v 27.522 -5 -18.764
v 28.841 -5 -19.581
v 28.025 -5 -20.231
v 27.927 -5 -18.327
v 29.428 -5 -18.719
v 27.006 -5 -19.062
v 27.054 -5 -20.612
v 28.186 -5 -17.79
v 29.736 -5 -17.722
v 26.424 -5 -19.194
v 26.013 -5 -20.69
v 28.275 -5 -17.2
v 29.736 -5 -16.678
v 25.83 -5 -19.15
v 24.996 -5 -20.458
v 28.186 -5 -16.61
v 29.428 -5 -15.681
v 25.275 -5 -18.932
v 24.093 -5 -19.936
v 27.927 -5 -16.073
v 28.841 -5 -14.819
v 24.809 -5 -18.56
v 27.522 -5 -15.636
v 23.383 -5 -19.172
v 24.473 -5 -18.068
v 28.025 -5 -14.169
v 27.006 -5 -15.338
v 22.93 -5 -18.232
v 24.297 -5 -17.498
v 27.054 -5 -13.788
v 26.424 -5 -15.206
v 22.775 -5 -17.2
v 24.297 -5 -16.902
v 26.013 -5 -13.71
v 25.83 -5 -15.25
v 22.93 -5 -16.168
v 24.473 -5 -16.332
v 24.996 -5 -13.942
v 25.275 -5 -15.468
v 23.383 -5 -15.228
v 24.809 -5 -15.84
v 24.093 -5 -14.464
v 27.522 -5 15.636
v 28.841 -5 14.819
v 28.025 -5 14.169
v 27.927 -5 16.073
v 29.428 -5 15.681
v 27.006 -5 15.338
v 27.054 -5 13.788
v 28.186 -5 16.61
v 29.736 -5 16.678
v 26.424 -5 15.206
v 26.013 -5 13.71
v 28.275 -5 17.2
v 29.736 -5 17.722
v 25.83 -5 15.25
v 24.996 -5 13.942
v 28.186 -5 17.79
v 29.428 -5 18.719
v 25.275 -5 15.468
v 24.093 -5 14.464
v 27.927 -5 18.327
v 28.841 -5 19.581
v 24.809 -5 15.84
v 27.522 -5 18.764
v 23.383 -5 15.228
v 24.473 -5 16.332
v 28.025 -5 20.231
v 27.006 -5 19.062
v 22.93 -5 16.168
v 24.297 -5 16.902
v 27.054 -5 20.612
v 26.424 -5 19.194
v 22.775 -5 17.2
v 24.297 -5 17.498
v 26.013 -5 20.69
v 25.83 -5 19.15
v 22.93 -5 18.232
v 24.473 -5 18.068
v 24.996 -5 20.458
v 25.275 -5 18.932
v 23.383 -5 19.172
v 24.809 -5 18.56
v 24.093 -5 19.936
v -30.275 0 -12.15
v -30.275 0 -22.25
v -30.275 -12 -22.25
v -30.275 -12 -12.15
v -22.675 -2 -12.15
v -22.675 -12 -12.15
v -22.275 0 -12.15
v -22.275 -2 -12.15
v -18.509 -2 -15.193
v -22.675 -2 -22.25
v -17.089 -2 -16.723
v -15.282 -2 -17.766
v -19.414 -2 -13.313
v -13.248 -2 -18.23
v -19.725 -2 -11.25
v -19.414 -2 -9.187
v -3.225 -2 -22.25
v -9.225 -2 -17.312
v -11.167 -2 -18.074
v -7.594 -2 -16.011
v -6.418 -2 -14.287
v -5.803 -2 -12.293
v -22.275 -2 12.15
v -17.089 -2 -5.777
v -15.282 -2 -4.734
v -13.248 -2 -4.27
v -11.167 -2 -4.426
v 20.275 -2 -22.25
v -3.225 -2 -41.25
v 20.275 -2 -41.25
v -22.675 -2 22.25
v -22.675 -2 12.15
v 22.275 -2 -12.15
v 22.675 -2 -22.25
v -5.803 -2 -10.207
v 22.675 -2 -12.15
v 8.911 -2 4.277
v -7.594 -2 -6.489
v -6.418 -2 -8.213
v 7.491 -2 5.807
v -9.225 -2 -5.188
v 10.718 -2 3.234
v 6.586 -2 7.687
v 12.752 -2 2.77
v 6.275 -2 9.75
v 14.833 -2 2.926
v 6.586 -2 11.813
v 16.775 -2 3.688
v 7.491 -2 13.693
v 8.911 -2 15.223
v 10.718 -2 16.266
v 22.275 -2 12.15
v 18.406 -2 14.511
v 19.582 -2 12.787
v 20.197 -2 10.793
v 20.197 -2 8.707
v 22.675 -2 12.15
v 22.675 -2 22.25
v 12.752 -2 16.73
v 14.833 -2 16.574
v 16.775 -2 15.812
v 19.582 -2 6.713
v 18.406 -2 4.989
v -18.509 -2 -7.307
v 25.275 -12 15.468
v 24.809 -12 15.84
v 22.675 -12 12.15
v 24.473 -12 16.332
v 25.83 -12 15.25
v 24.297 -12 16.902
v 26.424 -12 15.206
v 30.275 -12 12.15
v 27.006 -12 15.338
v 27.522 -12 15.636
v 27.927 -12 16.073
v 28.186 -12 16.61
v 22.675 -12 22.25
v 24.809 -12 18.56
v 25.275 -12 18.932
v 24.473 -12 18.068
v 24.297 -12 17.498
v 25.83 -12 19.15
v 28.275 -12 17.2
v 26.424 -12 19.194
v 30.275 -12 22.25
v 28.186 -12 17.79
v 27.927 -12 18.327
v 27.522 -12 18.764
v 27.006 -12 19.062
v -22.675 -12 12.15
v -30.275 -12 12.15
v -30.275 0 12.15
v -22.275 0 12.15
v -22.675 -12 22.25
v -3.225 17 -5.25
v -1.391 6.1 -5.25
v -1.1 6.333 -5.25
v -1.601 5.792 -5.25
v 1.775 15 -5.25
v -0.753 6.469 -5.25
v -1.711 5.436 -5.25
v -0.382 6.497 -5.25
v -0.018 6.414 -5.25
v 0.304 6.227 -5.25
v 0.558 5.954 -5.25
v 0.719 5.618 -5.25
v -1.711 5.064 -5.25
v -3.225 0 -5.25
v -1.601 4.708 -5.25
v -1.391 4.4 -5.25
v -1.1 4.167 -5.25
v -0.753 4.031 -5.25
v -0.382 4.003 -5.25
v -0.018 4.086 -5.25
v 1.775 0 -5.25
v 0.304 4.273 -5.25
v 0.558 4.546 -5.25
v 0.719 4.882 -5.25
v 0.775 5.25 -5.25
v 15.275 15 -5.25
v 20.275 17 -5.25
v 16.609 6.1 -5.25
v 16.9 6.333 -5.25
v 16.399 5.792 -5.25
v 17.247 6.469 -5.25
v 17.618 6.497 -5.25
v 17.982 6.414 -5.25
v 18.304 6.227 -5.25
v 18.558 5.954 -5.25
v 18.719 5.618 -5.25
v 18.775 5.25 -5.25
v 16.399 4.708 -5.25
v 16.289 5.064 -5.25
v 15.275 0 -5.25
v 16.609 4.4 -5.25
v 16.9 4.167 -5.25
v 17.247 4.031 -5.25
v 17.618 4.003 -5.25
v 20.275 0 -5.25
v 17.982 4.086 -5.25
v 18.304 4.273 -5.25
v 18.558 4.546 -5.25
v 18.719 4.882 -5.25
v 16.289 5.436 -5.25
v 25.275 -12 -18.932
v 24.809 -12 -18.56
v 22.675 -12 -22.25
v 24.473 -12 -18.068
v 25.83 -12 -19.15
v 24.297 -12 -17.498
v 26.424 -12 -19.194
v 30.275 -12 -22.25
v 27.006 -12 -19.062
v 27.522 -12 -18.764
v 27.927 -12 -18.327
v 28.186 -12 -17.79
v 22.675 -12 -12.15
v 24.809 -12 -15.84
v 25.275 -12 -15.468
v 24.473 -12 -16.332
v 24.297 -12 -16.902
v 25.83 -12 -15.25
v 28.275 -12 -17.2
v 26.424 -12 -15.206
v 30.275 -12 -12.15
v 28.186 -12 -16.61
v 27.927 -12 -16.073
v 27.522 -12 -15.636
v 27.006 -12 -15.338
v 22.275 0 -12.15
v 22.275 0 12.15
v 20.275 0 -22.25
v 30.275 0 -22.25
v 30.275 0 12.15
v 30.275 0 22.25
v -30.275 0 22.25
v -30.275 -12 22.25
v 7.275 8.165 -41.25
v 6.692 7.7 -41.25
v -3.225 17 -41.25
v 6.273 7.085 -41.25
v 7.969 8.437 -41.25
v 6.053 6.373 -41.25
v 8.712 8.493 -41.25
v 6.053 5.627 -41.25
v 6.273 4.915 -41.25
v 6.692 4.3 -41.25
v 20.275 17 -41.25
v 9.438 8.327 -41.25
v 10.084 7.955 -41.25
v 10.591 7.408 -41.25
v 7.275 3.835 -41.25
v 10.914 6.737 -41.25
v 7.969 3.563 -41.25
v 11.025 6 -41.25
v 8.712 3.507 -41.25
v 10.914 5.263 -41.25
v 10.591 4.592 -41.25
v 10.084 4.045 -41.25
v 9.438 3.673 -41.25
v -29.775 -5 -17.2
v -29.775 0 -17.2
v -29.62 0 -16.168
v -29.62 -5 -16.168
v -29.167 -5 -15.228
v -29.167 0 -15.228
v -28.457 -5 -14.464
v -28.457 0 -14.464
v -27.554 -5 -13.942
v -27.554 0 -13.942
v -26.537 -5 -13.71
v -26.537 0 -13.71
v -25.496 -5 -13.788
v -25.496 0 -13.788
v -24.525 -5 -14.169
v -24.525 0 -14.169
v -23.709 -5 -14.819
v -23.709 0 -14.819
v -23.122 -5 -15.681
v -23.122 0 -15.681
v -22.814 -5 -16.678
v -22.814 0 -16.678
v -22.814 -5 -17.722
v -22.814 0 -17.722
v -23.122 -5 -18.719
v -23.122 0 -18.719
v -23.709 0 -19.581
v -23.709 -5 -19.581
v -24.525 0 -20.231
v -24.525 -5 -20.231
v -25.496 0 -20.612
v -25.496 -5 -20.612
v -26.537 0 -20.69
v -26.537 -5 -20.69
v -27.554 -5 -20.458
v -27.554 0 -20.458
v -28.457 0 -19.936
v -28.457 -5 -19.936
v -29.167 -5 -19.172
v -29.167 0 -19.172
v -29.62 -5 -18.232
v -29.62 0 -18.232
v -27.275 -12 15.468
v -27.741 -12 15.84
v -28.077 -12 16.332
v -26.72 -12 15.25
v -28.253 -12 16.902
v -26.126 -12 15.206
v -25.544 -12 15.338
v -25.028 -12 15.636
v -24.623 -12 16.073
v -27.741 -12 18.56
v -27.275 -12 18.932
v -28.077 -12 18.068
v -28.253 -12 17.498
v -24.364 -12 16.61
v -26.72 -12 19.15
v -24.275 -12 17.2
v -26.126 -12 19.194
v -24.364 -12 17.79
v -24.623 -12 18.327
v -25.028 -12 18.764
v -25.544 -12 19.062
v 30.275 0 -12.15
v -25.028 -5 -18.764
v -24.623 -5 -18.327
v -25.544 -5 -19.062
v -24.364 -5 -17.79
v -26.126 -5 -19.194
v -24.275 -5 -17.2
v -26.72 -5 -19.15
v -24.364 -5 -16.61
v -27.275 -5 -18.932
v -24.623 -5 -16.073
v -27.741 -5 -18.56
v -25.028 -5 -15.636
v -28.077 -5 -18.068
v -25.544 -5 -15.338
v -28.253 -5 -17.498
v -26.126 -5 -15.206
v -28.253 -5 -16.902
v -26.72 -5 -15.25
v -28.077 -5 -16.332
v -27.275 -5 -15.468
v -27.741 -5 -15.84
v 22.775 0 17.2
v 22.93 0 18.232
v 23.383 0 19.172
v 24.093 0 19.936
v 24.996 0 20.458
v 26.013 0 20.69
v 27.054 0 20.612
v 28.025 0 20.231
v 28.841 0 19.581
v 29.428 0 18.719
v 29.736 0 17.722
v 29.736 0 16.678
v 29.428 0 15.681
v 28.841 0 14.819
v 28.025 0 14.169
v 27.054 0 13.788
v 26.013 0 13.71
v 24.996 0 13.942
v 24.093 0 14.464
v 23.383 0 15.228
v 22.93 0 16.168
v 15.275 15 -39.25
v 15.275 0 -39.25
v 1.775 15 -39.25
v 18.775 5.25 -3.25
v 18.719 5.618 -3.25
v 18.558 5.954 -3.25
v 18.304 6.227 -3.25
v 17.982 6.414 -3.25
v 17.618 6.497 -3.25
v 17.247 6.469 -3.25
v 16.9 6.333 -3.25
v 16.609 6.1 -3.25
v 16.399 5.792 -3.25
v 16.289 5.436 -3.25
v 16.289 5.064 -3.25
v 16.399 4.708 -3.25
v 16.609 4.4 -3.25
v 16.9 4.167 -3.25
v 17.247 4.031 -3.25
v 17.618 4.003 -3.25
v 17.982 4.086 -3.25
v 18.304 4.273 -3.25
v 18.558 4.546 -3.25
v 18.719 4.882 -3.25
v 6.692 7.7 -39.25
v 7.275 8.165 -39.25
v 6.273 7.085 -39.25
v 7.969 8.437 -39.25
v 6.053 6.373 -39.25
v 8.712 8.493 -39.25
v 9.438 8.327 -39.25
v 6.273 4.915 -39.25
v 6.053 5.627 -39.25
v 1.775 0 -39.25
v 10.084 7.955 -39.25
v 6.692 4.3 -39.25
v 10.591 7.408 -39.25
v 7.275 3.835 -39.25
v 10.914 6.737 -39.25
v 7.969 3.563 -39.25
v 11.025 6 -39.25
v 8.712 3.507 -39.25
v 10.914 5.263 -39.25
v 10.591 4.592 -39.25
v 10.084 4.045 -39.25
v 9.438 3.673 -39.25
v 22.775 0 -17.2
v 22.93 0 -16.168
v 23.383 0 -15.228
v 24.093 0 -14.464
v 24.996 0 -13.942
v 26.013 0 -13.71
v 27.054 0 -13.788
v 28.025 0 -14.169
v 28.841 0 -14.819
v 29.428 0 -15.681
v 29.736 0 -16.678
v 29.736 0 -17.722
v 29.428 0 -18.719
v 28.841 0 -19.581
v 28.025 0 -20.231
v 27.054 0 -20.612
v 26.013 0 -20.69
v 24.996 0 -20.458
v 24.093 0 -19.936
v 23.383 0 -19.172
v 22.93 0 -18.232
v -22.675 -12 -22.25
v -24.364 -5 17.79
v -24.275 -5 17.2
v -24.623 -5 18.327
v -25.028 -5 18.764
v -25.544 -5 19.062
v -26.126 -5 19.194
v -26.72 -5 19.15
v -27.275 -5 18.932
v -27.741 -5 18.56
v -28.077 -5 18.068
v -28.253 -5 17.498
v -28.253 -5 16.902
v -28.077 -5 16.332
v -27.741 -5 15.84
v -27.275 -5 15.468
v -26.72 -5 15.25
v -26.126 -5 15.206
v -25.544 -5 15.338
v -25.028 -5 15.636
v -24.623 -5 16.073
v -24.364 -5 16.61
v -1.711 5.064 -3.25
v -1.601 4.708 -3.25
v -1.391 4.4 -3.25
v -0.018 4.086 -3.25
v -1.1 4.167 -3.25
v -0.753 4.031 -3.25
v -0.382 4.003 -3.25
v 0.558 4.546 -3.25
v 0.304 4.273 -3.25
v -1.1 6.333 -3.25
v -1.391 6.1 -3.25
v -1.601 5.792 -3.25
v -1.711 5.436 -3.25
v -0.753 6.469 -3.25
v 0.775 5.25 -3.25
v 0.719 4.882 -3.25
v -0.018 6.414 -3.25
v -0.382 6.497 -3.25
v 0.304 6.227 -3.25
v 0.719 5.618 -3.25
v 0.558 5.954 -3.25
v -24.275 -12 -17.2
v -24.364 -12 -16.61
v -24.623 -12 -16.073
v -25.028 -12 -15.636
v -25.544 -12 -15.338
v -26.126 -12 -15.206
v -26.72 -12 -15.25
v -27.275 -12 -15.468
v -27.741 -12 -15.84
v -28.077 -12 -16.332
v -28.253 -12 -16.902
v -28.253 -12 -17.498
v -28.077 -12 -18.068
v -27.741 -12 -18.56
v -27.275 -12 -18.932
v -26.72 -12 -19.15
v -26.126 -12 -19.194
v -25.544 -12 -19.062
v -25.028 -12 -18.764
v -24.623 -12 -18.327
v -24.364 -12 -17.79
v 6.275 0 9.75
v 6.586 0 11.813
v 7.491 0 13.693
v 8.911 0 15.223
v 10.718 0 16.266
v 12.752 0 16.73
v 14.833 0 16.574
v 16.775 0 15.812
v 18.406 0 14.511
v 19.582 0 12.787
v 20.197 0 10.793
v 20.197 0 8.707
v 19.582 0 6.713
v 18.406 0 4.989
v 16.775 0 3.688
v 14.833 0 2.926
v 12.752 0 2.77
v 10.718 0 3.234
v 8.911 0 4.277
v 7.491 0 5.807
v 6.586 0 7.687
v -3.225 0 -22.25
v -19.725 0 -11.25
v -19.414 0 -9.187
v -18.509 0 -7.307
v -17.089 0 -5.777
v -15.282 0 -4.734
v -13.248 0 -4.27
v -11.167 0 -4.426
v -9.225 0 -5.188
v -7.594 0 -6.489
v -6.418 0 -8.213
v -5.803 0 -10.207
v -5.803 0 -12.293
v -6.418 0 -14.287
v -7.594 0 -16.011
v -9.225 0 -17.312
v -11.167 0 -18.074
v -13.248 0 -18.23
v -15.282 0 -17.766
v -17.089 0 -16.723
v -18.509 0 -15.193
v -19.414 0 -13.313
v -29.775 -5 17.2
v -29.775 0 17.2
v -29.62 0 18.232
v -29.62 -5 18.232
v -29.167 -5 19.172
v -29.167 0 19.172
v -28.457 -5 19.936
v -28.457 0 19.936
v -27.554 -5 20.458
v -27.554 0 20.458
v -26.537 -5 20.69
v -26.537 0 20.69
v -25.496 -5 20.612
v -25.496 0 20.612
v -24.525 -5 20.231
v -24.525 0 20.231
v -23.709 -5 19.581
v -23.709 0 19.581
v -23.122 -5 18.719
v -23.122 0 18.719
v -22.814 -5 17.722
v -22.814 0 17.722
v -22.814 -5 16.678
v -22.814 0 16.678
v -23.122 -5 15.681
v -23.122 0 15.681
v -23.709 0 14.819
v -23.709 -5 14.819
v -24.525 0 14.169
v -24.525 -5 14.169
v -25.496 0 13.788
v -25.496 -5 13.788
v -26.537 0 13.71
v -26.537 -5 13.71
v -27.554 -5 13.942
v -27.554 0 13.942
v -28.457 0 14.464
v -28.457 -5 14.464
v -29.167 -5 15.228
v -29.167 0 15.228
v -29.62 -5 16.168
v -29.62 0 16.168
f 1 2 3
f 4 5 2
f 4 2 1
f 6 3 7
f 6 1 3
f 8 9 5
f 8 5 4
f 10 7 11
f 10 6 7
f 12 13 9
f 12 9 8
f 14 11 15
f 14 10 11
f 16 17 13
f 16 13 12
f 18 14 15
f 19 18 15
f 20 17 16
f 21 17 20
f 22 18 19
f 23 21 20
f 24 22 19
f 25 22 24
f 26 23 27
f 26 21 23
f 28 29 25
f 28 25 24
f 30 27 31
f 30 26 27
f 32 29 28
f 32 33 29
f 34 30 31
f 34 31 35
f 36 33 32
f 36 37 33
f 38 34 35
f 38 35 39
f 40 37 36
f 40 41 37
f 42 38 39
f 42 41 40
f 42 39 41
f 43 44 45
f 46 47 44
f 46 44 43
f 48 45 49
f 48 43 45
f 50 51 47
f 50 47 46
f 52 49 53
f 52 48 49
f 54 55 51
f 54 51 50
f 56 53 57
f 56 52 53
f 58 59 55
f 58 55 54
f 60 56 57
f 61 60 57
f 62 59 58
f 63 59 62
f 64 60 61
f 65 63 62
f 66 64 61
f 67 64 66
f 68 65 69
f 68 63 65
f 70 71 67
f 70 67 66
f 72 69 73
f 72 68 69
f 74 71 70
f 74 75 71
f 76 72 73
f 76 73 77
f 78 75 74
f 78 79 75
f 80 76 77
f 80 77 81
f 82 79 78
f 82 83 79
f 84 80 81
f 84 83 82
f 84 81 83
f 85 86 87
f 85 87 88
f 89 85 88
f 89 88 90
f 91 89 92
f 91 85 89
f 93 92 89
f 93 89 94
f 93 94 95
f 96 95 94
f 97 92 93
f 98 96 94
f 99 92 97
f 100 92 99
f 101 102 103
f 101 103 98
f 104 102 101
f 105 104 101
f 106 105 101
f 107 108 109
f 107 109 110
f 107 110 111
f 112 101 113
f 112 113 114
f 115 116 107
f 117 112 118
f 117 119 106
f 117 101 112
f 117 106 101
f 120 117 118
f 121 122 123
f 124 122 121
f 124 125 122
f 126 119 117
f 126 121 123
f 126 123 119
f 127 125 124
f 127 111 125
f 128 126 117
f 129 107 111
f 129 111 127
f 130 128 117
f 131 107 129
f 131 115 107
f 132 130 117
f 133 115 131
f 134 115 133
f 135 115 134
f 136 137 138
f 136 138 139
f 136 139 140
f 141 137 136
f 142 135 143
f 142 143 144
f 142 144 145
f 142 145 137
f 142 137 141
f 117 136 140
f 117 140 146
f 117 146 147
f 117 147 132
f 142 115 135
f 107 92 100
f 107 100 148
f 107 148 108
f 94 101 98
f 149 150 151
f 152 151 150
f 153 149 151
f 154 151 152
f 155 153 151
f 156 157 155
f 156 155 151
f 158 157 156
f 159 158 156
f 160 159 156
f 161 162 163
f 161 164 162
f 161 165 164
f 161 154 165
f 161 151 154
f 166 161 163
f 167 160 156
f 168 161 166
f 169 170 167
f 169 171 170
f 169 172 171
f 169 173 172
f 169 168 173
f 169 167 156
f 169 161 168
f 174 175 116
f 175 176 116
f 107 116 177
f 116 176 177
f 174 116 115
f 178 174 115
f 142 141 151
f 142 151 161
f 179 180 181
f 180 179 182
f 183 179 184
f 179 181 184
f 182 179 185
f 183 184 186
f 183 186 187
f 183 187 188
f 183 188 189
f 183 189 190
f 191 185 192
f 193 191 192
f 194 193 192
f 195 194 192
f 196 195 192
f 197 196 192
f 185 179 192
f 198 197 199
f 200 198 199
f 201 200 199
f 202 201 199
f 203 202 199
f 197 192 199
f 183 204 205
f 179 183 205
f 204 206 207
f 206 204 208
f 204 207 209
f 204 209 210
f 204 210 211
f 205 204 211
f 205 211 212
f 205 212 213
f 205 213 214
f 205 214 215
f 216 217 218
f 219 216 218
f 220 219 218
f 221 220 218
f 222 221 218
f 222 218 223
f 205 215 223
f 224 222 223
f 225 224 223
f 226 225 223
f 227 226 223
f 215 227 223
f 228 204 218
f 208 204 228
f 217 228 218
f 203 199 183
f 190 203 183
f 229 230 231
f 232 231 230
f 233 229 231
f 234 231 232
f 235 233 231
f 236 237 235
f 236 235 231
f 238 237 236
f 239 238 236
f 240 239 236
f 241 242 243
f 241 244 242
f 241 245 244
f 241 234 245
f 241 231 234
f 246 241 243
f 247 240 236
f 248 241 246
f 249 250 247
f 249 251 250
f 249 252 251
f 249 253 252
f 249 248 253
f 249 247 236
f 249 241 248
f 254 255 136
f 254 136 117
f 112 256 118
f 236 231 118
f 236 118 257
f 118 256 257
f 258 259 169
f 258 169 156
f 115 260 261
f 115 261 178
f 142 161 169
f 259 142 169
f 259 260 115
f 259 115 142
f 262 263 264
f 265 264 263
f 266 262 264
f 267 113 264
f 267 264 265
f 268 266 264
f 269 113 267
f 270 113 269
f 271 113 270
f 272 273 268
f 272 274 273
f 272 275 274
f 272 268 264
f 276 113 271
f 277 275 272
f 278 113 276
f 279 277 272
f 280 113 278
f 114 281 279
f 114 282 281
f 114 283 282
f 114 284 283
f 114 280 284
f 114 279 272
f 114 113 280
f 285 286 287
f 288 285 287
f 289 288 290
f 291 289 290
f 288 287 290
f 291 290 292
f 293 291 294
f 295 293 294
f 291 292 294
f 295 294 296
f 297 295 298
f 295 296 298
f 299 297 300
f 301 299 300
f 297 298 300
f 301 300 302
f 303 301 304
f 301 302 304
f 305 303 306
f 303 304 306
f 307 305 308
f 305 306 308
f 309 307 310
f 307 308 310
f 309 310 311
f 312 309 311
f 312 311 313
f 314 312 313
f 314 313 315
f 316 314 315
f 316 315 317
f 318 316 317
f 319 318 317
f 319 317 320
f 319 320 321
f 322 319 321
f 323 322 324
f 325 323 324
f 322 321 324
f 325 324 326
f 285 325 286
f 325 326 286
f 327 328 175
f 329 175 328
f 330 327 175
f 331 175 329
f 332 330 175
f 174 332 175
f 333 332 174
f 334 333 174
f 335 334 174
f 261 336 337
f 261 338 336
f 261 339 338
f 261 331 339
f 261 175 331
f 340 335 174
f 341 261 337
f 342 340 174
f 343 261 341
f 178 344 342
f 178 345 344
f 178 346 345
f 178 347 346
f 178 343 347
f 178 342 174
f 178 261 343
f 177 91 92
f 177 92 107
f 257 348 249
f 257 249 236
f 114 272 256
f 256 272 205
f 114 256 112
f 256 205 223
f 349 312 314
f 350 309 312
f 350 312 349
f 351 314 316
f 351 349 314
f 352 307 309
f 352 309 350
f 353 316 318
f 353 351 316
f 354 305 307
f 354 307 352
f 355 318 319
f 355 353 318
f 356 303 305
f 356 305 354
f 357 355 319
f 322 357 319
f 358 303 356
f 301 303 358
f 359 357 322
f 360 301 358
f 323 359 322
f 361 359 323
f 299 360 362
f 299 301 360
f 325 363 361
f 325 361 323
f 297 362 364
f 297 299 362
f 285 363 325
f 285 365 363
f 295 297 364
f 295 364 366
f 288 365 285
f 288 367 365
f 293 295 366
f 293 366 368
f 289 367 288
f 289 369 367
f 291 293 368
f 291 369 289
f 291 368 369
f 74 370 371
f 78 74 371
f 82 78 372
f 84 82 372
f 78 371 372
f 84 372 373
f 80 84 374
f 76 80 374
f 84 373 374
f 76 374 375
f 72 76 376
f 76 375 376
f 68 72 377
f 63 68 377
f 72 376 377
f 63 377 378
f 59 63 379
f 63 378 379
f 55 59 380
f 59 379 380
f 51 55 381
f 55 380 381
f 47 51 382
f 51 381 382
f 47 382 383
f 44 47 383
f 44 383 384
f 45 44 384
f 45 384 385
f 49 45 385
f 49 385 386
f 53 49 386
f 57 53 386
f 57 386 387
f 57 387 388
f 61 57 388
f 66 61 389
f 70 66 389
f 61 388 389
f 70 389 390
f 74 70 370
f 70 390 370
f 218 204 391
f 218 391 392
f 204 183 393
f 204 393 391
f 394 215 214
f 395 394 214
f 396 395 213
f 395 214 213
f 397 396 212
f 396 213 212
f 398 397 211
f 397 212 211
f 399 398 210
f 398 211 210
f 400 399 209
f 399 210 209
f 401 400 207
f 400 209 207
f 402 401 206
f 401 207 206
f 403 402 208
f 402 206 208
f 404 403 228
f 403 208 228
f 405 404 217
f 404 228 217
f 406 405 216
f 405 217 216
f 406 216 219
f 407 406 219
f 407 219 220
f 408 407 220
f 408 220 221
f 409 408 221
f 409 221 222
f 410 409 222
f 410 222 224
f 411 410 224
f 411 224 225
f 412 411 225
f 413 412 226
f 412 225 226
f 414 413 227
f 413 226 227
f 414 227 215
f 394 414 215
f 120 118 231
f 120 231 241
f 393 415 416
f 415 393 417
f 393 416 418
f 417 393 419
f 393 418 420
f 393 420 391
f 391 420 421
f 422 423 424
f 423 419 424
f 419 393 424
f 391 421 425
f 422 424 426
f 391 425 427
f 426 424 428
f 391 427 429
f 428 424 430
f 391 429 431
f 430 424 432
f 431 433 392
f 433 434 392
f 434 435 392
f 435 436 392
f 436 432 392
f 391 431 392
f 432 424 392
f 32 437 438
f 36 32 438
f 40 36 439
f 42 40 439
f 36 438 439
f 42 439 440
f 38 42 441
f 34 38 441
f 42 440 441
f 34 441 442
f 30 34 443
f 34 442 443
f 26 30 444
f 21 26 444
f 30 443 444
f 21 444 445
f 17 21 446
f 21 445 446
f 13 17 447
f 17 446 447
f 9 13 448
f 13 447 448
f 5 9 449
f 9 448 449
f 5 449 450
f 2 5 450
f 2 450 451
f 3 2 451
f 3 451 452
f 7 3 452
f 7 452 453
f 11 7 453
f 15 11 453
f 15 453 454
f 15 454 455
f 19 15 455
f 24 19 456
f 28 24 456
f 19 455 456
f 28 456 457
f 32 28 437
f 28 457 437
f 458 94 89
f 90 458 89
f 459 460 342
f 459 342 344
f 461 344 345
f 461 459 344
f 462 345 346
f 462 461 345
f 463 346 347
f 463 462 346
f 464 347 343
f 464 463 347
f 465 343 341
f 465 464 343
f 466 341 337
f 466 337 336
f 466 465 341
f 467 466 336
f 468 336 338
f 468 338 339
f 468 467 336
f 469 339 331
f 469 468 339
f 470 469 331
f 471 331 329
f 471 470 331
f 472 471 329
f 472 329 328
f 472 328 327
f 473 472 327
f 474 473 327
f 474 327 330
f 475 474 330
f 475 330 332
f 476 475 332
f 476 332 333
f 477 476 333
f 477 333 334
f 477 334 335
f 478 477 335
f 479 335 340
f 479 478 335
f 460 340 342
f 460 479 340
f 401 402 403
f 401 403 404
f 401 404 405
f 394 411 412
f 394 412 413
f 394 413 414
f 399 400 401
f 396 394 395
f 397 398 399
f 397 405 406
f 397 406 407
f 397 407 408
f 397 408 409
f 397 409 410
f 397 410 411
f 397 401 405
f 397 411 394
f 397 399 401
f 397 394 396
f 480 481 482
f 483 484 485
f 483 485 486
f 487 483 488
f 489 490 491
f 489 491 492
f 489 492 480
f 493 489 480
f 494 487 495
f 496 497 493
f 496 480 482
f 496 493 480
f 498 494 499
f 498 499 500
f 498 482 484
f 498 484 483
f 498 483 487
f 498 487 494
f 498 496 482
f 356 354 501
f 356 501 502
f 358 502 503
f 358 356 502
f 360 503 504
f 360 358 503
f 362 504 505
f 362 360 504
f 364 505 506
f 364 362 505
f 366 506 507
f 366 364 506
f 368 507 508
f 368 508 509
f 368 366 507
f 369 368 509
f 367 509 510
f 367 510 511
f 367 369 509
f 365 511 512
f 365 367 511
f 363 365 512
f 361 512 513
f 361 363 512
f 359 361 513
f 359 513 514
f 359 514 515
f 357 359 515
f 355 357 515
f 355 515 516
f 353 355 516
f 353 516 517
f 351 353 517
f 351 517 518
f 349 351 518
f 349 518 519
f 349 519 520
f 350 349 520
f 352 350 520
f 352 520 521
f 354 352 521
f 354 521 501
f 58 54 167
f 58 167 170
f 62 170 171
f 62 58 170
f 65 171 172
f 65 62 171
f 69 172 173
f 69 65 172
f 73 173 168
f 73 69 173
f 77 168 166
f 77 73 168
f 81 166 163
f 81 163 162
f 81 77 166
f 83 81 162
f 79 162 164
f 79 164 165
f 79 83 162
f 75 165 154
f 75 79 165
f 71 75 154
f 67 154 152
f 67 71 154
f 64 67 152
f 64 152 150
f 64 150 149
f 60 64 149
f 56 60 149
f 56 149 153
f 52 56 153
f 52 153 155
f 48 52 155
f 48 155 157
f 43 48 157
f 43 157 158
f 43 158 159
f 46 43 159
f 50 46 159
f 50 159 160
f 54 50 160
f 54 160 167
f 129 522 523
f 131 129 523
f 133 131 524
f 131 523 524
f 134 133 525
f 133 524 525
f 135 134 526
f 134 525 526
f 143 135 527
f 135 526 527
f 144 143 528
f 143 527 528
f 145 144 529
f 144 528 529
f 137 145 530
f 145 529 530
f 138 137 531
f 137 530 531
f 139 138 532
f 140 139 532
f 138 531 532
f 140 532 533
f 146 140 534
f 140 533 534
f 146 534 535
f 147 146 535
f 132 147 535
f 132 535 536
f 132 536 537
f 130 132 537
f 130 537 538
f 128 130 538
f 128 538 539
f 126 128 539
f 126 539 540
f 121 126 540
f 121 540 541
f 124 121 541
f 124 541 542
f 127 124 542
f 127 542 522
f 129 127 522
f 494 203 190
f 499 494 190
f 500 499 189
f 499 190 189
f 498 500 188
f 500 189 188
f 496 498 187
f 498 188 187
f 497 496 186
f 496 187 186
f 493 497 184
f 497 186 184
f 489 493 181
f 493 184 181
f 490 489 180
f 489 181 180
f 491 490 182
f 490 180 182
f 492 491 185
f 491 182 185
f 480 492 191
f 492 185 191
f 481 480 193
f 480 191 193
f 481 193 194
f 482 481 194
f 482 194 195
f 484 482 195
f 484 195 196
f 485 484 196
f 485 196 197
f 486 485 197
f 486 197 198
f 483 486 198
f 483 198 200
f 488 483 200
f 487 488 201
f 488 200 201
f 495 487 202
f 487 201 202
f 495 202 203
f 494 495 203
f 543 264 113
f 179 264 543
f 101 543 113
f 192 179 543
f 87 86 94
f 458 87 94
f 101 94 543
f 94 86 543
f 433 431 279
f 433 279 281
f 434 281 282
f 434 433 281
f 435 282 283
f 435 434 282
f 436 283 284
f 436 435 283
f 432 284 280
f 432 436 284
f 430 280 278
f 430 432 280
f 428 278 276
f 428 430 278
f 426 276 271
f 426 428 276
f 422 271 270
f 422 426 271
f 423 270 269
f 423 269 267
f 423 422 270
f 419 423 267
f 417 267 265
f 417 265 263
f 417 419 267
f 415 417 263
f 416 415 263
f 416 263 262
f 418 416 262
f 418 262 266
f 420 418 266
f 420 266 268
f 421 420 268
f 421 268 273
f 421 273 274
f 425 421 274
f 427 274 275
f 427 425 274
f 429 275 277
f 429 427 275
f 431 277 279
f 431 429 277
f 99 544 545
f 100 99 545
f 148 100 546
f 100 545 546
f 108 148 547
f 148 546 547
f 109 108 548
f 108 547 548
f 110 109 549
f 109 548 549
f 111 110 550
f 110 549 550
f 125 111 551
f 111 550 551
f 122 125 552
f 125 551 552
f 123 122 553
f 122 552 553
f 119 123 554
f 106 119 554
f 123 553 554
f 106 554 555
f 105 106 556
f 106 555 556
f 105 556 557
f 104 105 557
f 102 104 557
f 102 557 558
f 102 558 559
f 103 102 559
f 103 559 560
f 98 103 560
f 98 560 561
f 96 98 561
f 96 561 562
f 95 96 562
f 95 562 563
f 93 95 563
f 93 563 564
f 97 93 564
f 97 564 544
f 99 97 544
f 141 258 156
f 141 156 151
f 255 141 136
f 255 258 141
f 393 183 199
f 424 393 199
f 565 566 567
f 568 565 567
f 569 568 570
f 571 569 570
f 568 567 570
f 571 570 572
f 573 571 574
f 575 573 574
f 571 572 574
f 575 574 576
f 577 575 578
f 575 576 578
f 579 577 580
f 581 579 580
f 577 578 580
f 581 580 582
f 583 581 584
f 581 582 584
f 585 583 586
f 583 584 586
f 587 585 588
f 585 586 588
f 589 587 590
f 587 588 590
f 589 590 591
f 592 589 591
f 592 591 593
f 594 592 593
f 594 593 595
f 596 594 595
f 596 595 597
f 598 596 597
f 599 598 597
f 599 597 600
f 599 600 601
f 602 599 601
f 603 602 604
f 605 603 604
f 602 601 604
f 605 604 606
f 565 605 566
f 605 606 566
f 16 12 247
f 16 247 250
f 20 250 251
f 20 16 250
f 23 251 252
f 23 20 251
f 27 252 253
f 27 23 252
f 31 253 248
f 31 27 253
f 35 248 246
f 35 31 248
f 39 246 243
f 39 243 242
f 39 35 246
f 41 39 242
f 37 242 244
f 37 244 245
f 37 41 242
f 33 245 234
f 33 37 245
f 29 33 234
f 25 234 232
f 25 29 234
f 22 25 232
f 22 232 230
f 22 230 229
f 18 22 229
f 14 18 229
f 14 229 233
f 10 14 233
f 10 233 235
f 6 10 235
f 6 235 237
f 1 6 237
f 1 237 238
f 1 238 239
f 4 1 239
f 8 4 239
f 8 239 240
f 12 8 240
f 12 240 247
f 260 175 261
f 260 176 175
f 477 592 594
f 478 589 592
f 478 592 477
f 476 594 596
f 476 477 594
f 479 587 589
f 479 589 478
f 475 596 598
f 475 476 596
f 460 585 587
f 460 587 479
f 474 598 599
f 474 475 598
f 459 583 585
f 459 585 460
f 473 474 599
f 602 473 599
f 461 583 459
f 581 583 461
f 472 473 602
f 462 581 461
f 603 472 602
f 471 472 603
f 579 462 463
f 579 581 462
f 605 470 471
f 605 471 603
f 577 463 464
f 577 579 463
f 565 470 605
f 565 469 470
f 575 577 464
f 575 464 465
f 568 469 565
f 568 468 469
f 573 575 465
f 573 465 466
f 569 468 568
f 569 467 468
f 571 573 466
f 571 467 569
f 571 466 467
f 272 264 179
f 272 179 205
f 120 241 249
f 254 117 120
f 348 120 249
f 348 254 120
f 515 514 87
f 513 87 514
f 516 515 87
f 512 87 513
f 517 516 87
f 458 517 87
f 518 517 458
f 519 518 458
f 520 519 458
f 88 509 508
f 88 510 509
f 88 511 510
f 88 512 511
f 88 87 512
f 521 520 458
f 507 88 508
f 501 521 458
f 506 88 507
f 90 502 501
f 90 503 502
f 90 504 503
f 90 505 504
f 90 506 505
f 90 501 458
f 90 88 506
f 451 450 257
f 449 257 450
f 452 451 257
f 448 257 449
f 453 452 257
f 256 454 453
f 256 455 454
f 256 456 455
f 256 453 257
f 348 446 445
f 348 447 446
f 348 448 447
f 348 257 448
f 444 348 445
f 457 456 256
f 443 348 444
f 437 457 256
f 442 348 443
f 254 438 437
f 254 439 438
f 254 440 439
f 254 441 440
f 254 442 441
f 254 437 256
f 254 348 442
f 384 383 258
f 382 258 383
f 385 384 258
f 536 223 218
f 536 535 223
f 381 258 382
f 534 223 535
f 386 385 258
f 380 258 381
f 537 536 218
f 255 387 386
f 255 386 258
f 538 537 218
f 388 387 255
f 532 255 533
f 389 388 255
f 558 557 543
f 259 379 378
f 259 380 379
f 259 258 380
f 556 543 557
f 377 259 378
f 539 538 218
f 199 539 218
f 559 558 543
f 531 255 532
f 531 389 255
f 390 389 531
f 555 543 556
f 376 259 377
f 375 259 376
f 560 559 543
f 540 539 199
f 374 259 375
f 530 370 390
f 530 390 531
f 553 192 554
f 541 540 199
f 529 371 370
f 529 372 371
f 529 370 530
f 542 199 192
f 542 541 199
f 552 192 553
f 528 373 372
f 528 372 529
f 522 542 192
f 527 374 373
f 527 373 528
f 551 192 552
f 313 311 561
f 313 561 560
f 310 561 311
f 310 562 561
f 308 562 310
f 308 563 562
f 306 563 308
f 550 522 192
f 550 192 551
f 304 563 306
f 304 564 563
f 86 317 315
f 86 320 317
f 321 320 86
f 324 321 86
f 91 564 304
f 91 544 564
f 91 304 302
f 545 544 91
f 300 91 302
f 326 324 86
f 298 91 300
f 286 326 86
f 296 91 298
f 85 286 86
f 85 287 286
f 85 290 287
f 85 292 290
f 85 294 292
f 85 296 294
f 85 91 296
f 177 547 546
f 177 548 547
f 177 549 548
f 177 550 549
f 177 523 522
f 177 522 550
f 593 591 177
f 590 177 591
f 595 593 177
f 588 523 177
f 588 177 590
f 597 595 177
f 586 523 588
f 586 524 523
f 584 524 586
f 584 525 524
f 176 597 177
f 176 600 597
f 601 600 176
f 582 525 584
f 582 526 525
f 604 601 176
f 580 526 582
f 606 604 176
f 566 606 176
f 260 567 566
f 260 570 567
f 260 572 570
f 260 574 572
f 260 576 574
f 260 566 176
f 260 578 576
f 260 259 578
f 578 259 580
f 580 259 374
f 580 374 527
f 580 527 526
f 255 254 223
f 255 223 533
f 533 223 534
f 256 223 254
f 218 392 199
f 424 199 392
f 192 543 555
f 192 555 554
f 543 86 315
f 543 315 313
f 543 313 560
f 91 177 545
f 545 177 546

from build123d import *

# Parameters (mm, degrees)
SKETCH_R        = 2
PAD_DEPTH       = 2
SKETCH001_W     = 7.6
SKETCH001_H     = 10.1
SKETCH001_R     = 2
PAD001_DEPTH    = 10
SKETCH002_R     = 7
POCKET_DEPTH    = 12.001
SKETCH004_W     = 13.5
SKETCH004_H     = 15
PAD003_DEPTH    = 34
SKETCH005_W     = 23.5
SKETCH005_H     = 19
SKETCH005_R     = 2.5
PAD004_DEPTH    = 2
SKETCH006_R     = 1.25
PAD005_DEPTH    = 2
SKETCH007_R     = 3.5
POCKET001_DEPTH = 5


with BuildPart() as part:
    # Sketch → Pad (new body)
    with BuildSketch(Plane.XZ):
        Polygon((-22.275, 22.25), (22.275, 22.25), (30.275, 22.25), (30.275, 12.15), (22.275, 12.15), (22.275, -12.15), (30.275, -12.15), (30.275, -22.25), (22.275, -22.25), (-22.275, -22.25), (-30.275, -22.25), (-30.275, -12.15), (-22.275, -12.15), (-22.275, 12.15), (-30.275, 12.15), (-30.275, 22.25), align=None)
        with Locations((-26.275, 17.2)):
            Circle(SKETCH_R, mode=Mode.SUBTRACT)
        with Locations((26.275, 17.2)):
            Circle(SKETCH_R, mode=Mode.SUBTRACT)
        with Locations((26.275, -17.2)):
            Circle(SKETCH_R, mode=Mode.SUBTRACT)
        with Locations((-26.275, -17.2)):
            Circle(SKETCH_R, mode=Mode.SUBTRACT)
    extrude(amount=PAD_DEPTH)

    # Sketch001 (on Face22 of Pad) → Pad001 (join)
    with BuildSketch(Plane.XZ.offset(2)):
        with Locations((-26.475, 17.2)):
            Rectangle(SKETCH001_W, SKETCH001_H)
        with Locations((-26.275, 17.2)):
            Circle(SKETCH001_R, mode=Mode.SUBTRACT)
        with Locations((-26.475, -17.2)):
            Rectangle(SKETCH001_W, SKETCH001_H)
        with Locations((-26.275, -17.2)):
            Circle(SKETCH001_R, mode=Mode.SUBTRACT)
        with Locations((26.475, -17.2)):
            Rectangle(SKETCH001_W, SKETCH001_H)
        with Locations((26.275, -17.2)):
            Circle(SKETCH001_R, mode=Mode.SUBTRACT)
        with Locations((26.475, 17.2)):
            Rectangle(SKETCH001_W, SKETCH001_H)
        with Locations((26.275, 17.2)):
            Circle(SKETCH001_R, mode=Mode.SUBTRACT)
    extrude(amount=PAD001_DEPTH)

    # Sketch002 (on Face4 of Pad001) → Pocket (cut, through all)
    with BuildSketch(Plane(origin=(0, 0, 0), x_dir=(-1, 0, 0), z_dir=(0, 1, 0))):
        with Locations((-13.275, 9.75)):
            Circle(SKETCH002_R)
        with Locations((12.725, -11.25)):
            Circle(SKETCH002_R)
    extrude(amount=-POCKET_DEPTH, mode=Mode.SUBTRACT)

    # Sketch004 (on DatumPlane) → Pad003 (join)
    with BuildSketch(Plane(origin=(0, 0, -5.25), x_dir=(1, 0, 0), z_dir=(0, 0, -1))):
        Polygon((-3.225, 0), (-3.225, -17), (20.275, -17), (20.275, 0), (20.275, 2), (-3.225, 2), align=None)
        with Locations((8.525, -7.5)):
            Rectangle(SKETCH004_W, SKETCH004_H, mode=Mode.SUBTRACT)
    extrude(amount=PAD003_DEPTH)

    # Sketch005 (on Face45 of Pad003) → Pad004 (join)
    with BuildSketch(Plane(origin=(0, 0, -39.25), x_dir=(1, 0, 0), z_dir=(0, 0, -1))):
        with Locations((8.525, -7.5)):
            Rectangle(SKETCH005_W, SKETCH005_H)
        with Locations((8.525, -6)):
            Circle(SKETCH005_R, mode=Mode.SUBTRACT)
    extrude(amount=PAD004_DEPTH)

    # Sketch006 (on Face16 of Pad004) → Pad005 (join)
    with BuildSketch(Plane.XY.offset(-5.25)):
        with Locations((-0.475, 5.25)):
            Circle(SKETCH006_R)
        with Locations((17.525, 5.25)):
            Circle(SKETCH006_R)
    extrude(amount=PAD005_DEPTH)

    # Sketch007 (on Face4 of Pad005) → Pocket001 (cut)
    with BuildSketch(Plane(origin=(0, 0, 0), x_dir=(-1, 0, 0), z_dir=(0, 1, 0))):
        with Locations((26.275, -17.2)):
            Circle(SKETCH007_R)
        with Locations((26.275, 17.2)):
            Circle(SKETCH007_R)
        with Locations((-26.275, 17.2)):
            Circle(SKETCH007_R)
        with Locations((-26.275, -17.2)):
            Circle(SKETCH007_R)
    extrude(amount=-POCKET001_DEPTH, mode=Mode.SUBTRACT)


solid = part.part
